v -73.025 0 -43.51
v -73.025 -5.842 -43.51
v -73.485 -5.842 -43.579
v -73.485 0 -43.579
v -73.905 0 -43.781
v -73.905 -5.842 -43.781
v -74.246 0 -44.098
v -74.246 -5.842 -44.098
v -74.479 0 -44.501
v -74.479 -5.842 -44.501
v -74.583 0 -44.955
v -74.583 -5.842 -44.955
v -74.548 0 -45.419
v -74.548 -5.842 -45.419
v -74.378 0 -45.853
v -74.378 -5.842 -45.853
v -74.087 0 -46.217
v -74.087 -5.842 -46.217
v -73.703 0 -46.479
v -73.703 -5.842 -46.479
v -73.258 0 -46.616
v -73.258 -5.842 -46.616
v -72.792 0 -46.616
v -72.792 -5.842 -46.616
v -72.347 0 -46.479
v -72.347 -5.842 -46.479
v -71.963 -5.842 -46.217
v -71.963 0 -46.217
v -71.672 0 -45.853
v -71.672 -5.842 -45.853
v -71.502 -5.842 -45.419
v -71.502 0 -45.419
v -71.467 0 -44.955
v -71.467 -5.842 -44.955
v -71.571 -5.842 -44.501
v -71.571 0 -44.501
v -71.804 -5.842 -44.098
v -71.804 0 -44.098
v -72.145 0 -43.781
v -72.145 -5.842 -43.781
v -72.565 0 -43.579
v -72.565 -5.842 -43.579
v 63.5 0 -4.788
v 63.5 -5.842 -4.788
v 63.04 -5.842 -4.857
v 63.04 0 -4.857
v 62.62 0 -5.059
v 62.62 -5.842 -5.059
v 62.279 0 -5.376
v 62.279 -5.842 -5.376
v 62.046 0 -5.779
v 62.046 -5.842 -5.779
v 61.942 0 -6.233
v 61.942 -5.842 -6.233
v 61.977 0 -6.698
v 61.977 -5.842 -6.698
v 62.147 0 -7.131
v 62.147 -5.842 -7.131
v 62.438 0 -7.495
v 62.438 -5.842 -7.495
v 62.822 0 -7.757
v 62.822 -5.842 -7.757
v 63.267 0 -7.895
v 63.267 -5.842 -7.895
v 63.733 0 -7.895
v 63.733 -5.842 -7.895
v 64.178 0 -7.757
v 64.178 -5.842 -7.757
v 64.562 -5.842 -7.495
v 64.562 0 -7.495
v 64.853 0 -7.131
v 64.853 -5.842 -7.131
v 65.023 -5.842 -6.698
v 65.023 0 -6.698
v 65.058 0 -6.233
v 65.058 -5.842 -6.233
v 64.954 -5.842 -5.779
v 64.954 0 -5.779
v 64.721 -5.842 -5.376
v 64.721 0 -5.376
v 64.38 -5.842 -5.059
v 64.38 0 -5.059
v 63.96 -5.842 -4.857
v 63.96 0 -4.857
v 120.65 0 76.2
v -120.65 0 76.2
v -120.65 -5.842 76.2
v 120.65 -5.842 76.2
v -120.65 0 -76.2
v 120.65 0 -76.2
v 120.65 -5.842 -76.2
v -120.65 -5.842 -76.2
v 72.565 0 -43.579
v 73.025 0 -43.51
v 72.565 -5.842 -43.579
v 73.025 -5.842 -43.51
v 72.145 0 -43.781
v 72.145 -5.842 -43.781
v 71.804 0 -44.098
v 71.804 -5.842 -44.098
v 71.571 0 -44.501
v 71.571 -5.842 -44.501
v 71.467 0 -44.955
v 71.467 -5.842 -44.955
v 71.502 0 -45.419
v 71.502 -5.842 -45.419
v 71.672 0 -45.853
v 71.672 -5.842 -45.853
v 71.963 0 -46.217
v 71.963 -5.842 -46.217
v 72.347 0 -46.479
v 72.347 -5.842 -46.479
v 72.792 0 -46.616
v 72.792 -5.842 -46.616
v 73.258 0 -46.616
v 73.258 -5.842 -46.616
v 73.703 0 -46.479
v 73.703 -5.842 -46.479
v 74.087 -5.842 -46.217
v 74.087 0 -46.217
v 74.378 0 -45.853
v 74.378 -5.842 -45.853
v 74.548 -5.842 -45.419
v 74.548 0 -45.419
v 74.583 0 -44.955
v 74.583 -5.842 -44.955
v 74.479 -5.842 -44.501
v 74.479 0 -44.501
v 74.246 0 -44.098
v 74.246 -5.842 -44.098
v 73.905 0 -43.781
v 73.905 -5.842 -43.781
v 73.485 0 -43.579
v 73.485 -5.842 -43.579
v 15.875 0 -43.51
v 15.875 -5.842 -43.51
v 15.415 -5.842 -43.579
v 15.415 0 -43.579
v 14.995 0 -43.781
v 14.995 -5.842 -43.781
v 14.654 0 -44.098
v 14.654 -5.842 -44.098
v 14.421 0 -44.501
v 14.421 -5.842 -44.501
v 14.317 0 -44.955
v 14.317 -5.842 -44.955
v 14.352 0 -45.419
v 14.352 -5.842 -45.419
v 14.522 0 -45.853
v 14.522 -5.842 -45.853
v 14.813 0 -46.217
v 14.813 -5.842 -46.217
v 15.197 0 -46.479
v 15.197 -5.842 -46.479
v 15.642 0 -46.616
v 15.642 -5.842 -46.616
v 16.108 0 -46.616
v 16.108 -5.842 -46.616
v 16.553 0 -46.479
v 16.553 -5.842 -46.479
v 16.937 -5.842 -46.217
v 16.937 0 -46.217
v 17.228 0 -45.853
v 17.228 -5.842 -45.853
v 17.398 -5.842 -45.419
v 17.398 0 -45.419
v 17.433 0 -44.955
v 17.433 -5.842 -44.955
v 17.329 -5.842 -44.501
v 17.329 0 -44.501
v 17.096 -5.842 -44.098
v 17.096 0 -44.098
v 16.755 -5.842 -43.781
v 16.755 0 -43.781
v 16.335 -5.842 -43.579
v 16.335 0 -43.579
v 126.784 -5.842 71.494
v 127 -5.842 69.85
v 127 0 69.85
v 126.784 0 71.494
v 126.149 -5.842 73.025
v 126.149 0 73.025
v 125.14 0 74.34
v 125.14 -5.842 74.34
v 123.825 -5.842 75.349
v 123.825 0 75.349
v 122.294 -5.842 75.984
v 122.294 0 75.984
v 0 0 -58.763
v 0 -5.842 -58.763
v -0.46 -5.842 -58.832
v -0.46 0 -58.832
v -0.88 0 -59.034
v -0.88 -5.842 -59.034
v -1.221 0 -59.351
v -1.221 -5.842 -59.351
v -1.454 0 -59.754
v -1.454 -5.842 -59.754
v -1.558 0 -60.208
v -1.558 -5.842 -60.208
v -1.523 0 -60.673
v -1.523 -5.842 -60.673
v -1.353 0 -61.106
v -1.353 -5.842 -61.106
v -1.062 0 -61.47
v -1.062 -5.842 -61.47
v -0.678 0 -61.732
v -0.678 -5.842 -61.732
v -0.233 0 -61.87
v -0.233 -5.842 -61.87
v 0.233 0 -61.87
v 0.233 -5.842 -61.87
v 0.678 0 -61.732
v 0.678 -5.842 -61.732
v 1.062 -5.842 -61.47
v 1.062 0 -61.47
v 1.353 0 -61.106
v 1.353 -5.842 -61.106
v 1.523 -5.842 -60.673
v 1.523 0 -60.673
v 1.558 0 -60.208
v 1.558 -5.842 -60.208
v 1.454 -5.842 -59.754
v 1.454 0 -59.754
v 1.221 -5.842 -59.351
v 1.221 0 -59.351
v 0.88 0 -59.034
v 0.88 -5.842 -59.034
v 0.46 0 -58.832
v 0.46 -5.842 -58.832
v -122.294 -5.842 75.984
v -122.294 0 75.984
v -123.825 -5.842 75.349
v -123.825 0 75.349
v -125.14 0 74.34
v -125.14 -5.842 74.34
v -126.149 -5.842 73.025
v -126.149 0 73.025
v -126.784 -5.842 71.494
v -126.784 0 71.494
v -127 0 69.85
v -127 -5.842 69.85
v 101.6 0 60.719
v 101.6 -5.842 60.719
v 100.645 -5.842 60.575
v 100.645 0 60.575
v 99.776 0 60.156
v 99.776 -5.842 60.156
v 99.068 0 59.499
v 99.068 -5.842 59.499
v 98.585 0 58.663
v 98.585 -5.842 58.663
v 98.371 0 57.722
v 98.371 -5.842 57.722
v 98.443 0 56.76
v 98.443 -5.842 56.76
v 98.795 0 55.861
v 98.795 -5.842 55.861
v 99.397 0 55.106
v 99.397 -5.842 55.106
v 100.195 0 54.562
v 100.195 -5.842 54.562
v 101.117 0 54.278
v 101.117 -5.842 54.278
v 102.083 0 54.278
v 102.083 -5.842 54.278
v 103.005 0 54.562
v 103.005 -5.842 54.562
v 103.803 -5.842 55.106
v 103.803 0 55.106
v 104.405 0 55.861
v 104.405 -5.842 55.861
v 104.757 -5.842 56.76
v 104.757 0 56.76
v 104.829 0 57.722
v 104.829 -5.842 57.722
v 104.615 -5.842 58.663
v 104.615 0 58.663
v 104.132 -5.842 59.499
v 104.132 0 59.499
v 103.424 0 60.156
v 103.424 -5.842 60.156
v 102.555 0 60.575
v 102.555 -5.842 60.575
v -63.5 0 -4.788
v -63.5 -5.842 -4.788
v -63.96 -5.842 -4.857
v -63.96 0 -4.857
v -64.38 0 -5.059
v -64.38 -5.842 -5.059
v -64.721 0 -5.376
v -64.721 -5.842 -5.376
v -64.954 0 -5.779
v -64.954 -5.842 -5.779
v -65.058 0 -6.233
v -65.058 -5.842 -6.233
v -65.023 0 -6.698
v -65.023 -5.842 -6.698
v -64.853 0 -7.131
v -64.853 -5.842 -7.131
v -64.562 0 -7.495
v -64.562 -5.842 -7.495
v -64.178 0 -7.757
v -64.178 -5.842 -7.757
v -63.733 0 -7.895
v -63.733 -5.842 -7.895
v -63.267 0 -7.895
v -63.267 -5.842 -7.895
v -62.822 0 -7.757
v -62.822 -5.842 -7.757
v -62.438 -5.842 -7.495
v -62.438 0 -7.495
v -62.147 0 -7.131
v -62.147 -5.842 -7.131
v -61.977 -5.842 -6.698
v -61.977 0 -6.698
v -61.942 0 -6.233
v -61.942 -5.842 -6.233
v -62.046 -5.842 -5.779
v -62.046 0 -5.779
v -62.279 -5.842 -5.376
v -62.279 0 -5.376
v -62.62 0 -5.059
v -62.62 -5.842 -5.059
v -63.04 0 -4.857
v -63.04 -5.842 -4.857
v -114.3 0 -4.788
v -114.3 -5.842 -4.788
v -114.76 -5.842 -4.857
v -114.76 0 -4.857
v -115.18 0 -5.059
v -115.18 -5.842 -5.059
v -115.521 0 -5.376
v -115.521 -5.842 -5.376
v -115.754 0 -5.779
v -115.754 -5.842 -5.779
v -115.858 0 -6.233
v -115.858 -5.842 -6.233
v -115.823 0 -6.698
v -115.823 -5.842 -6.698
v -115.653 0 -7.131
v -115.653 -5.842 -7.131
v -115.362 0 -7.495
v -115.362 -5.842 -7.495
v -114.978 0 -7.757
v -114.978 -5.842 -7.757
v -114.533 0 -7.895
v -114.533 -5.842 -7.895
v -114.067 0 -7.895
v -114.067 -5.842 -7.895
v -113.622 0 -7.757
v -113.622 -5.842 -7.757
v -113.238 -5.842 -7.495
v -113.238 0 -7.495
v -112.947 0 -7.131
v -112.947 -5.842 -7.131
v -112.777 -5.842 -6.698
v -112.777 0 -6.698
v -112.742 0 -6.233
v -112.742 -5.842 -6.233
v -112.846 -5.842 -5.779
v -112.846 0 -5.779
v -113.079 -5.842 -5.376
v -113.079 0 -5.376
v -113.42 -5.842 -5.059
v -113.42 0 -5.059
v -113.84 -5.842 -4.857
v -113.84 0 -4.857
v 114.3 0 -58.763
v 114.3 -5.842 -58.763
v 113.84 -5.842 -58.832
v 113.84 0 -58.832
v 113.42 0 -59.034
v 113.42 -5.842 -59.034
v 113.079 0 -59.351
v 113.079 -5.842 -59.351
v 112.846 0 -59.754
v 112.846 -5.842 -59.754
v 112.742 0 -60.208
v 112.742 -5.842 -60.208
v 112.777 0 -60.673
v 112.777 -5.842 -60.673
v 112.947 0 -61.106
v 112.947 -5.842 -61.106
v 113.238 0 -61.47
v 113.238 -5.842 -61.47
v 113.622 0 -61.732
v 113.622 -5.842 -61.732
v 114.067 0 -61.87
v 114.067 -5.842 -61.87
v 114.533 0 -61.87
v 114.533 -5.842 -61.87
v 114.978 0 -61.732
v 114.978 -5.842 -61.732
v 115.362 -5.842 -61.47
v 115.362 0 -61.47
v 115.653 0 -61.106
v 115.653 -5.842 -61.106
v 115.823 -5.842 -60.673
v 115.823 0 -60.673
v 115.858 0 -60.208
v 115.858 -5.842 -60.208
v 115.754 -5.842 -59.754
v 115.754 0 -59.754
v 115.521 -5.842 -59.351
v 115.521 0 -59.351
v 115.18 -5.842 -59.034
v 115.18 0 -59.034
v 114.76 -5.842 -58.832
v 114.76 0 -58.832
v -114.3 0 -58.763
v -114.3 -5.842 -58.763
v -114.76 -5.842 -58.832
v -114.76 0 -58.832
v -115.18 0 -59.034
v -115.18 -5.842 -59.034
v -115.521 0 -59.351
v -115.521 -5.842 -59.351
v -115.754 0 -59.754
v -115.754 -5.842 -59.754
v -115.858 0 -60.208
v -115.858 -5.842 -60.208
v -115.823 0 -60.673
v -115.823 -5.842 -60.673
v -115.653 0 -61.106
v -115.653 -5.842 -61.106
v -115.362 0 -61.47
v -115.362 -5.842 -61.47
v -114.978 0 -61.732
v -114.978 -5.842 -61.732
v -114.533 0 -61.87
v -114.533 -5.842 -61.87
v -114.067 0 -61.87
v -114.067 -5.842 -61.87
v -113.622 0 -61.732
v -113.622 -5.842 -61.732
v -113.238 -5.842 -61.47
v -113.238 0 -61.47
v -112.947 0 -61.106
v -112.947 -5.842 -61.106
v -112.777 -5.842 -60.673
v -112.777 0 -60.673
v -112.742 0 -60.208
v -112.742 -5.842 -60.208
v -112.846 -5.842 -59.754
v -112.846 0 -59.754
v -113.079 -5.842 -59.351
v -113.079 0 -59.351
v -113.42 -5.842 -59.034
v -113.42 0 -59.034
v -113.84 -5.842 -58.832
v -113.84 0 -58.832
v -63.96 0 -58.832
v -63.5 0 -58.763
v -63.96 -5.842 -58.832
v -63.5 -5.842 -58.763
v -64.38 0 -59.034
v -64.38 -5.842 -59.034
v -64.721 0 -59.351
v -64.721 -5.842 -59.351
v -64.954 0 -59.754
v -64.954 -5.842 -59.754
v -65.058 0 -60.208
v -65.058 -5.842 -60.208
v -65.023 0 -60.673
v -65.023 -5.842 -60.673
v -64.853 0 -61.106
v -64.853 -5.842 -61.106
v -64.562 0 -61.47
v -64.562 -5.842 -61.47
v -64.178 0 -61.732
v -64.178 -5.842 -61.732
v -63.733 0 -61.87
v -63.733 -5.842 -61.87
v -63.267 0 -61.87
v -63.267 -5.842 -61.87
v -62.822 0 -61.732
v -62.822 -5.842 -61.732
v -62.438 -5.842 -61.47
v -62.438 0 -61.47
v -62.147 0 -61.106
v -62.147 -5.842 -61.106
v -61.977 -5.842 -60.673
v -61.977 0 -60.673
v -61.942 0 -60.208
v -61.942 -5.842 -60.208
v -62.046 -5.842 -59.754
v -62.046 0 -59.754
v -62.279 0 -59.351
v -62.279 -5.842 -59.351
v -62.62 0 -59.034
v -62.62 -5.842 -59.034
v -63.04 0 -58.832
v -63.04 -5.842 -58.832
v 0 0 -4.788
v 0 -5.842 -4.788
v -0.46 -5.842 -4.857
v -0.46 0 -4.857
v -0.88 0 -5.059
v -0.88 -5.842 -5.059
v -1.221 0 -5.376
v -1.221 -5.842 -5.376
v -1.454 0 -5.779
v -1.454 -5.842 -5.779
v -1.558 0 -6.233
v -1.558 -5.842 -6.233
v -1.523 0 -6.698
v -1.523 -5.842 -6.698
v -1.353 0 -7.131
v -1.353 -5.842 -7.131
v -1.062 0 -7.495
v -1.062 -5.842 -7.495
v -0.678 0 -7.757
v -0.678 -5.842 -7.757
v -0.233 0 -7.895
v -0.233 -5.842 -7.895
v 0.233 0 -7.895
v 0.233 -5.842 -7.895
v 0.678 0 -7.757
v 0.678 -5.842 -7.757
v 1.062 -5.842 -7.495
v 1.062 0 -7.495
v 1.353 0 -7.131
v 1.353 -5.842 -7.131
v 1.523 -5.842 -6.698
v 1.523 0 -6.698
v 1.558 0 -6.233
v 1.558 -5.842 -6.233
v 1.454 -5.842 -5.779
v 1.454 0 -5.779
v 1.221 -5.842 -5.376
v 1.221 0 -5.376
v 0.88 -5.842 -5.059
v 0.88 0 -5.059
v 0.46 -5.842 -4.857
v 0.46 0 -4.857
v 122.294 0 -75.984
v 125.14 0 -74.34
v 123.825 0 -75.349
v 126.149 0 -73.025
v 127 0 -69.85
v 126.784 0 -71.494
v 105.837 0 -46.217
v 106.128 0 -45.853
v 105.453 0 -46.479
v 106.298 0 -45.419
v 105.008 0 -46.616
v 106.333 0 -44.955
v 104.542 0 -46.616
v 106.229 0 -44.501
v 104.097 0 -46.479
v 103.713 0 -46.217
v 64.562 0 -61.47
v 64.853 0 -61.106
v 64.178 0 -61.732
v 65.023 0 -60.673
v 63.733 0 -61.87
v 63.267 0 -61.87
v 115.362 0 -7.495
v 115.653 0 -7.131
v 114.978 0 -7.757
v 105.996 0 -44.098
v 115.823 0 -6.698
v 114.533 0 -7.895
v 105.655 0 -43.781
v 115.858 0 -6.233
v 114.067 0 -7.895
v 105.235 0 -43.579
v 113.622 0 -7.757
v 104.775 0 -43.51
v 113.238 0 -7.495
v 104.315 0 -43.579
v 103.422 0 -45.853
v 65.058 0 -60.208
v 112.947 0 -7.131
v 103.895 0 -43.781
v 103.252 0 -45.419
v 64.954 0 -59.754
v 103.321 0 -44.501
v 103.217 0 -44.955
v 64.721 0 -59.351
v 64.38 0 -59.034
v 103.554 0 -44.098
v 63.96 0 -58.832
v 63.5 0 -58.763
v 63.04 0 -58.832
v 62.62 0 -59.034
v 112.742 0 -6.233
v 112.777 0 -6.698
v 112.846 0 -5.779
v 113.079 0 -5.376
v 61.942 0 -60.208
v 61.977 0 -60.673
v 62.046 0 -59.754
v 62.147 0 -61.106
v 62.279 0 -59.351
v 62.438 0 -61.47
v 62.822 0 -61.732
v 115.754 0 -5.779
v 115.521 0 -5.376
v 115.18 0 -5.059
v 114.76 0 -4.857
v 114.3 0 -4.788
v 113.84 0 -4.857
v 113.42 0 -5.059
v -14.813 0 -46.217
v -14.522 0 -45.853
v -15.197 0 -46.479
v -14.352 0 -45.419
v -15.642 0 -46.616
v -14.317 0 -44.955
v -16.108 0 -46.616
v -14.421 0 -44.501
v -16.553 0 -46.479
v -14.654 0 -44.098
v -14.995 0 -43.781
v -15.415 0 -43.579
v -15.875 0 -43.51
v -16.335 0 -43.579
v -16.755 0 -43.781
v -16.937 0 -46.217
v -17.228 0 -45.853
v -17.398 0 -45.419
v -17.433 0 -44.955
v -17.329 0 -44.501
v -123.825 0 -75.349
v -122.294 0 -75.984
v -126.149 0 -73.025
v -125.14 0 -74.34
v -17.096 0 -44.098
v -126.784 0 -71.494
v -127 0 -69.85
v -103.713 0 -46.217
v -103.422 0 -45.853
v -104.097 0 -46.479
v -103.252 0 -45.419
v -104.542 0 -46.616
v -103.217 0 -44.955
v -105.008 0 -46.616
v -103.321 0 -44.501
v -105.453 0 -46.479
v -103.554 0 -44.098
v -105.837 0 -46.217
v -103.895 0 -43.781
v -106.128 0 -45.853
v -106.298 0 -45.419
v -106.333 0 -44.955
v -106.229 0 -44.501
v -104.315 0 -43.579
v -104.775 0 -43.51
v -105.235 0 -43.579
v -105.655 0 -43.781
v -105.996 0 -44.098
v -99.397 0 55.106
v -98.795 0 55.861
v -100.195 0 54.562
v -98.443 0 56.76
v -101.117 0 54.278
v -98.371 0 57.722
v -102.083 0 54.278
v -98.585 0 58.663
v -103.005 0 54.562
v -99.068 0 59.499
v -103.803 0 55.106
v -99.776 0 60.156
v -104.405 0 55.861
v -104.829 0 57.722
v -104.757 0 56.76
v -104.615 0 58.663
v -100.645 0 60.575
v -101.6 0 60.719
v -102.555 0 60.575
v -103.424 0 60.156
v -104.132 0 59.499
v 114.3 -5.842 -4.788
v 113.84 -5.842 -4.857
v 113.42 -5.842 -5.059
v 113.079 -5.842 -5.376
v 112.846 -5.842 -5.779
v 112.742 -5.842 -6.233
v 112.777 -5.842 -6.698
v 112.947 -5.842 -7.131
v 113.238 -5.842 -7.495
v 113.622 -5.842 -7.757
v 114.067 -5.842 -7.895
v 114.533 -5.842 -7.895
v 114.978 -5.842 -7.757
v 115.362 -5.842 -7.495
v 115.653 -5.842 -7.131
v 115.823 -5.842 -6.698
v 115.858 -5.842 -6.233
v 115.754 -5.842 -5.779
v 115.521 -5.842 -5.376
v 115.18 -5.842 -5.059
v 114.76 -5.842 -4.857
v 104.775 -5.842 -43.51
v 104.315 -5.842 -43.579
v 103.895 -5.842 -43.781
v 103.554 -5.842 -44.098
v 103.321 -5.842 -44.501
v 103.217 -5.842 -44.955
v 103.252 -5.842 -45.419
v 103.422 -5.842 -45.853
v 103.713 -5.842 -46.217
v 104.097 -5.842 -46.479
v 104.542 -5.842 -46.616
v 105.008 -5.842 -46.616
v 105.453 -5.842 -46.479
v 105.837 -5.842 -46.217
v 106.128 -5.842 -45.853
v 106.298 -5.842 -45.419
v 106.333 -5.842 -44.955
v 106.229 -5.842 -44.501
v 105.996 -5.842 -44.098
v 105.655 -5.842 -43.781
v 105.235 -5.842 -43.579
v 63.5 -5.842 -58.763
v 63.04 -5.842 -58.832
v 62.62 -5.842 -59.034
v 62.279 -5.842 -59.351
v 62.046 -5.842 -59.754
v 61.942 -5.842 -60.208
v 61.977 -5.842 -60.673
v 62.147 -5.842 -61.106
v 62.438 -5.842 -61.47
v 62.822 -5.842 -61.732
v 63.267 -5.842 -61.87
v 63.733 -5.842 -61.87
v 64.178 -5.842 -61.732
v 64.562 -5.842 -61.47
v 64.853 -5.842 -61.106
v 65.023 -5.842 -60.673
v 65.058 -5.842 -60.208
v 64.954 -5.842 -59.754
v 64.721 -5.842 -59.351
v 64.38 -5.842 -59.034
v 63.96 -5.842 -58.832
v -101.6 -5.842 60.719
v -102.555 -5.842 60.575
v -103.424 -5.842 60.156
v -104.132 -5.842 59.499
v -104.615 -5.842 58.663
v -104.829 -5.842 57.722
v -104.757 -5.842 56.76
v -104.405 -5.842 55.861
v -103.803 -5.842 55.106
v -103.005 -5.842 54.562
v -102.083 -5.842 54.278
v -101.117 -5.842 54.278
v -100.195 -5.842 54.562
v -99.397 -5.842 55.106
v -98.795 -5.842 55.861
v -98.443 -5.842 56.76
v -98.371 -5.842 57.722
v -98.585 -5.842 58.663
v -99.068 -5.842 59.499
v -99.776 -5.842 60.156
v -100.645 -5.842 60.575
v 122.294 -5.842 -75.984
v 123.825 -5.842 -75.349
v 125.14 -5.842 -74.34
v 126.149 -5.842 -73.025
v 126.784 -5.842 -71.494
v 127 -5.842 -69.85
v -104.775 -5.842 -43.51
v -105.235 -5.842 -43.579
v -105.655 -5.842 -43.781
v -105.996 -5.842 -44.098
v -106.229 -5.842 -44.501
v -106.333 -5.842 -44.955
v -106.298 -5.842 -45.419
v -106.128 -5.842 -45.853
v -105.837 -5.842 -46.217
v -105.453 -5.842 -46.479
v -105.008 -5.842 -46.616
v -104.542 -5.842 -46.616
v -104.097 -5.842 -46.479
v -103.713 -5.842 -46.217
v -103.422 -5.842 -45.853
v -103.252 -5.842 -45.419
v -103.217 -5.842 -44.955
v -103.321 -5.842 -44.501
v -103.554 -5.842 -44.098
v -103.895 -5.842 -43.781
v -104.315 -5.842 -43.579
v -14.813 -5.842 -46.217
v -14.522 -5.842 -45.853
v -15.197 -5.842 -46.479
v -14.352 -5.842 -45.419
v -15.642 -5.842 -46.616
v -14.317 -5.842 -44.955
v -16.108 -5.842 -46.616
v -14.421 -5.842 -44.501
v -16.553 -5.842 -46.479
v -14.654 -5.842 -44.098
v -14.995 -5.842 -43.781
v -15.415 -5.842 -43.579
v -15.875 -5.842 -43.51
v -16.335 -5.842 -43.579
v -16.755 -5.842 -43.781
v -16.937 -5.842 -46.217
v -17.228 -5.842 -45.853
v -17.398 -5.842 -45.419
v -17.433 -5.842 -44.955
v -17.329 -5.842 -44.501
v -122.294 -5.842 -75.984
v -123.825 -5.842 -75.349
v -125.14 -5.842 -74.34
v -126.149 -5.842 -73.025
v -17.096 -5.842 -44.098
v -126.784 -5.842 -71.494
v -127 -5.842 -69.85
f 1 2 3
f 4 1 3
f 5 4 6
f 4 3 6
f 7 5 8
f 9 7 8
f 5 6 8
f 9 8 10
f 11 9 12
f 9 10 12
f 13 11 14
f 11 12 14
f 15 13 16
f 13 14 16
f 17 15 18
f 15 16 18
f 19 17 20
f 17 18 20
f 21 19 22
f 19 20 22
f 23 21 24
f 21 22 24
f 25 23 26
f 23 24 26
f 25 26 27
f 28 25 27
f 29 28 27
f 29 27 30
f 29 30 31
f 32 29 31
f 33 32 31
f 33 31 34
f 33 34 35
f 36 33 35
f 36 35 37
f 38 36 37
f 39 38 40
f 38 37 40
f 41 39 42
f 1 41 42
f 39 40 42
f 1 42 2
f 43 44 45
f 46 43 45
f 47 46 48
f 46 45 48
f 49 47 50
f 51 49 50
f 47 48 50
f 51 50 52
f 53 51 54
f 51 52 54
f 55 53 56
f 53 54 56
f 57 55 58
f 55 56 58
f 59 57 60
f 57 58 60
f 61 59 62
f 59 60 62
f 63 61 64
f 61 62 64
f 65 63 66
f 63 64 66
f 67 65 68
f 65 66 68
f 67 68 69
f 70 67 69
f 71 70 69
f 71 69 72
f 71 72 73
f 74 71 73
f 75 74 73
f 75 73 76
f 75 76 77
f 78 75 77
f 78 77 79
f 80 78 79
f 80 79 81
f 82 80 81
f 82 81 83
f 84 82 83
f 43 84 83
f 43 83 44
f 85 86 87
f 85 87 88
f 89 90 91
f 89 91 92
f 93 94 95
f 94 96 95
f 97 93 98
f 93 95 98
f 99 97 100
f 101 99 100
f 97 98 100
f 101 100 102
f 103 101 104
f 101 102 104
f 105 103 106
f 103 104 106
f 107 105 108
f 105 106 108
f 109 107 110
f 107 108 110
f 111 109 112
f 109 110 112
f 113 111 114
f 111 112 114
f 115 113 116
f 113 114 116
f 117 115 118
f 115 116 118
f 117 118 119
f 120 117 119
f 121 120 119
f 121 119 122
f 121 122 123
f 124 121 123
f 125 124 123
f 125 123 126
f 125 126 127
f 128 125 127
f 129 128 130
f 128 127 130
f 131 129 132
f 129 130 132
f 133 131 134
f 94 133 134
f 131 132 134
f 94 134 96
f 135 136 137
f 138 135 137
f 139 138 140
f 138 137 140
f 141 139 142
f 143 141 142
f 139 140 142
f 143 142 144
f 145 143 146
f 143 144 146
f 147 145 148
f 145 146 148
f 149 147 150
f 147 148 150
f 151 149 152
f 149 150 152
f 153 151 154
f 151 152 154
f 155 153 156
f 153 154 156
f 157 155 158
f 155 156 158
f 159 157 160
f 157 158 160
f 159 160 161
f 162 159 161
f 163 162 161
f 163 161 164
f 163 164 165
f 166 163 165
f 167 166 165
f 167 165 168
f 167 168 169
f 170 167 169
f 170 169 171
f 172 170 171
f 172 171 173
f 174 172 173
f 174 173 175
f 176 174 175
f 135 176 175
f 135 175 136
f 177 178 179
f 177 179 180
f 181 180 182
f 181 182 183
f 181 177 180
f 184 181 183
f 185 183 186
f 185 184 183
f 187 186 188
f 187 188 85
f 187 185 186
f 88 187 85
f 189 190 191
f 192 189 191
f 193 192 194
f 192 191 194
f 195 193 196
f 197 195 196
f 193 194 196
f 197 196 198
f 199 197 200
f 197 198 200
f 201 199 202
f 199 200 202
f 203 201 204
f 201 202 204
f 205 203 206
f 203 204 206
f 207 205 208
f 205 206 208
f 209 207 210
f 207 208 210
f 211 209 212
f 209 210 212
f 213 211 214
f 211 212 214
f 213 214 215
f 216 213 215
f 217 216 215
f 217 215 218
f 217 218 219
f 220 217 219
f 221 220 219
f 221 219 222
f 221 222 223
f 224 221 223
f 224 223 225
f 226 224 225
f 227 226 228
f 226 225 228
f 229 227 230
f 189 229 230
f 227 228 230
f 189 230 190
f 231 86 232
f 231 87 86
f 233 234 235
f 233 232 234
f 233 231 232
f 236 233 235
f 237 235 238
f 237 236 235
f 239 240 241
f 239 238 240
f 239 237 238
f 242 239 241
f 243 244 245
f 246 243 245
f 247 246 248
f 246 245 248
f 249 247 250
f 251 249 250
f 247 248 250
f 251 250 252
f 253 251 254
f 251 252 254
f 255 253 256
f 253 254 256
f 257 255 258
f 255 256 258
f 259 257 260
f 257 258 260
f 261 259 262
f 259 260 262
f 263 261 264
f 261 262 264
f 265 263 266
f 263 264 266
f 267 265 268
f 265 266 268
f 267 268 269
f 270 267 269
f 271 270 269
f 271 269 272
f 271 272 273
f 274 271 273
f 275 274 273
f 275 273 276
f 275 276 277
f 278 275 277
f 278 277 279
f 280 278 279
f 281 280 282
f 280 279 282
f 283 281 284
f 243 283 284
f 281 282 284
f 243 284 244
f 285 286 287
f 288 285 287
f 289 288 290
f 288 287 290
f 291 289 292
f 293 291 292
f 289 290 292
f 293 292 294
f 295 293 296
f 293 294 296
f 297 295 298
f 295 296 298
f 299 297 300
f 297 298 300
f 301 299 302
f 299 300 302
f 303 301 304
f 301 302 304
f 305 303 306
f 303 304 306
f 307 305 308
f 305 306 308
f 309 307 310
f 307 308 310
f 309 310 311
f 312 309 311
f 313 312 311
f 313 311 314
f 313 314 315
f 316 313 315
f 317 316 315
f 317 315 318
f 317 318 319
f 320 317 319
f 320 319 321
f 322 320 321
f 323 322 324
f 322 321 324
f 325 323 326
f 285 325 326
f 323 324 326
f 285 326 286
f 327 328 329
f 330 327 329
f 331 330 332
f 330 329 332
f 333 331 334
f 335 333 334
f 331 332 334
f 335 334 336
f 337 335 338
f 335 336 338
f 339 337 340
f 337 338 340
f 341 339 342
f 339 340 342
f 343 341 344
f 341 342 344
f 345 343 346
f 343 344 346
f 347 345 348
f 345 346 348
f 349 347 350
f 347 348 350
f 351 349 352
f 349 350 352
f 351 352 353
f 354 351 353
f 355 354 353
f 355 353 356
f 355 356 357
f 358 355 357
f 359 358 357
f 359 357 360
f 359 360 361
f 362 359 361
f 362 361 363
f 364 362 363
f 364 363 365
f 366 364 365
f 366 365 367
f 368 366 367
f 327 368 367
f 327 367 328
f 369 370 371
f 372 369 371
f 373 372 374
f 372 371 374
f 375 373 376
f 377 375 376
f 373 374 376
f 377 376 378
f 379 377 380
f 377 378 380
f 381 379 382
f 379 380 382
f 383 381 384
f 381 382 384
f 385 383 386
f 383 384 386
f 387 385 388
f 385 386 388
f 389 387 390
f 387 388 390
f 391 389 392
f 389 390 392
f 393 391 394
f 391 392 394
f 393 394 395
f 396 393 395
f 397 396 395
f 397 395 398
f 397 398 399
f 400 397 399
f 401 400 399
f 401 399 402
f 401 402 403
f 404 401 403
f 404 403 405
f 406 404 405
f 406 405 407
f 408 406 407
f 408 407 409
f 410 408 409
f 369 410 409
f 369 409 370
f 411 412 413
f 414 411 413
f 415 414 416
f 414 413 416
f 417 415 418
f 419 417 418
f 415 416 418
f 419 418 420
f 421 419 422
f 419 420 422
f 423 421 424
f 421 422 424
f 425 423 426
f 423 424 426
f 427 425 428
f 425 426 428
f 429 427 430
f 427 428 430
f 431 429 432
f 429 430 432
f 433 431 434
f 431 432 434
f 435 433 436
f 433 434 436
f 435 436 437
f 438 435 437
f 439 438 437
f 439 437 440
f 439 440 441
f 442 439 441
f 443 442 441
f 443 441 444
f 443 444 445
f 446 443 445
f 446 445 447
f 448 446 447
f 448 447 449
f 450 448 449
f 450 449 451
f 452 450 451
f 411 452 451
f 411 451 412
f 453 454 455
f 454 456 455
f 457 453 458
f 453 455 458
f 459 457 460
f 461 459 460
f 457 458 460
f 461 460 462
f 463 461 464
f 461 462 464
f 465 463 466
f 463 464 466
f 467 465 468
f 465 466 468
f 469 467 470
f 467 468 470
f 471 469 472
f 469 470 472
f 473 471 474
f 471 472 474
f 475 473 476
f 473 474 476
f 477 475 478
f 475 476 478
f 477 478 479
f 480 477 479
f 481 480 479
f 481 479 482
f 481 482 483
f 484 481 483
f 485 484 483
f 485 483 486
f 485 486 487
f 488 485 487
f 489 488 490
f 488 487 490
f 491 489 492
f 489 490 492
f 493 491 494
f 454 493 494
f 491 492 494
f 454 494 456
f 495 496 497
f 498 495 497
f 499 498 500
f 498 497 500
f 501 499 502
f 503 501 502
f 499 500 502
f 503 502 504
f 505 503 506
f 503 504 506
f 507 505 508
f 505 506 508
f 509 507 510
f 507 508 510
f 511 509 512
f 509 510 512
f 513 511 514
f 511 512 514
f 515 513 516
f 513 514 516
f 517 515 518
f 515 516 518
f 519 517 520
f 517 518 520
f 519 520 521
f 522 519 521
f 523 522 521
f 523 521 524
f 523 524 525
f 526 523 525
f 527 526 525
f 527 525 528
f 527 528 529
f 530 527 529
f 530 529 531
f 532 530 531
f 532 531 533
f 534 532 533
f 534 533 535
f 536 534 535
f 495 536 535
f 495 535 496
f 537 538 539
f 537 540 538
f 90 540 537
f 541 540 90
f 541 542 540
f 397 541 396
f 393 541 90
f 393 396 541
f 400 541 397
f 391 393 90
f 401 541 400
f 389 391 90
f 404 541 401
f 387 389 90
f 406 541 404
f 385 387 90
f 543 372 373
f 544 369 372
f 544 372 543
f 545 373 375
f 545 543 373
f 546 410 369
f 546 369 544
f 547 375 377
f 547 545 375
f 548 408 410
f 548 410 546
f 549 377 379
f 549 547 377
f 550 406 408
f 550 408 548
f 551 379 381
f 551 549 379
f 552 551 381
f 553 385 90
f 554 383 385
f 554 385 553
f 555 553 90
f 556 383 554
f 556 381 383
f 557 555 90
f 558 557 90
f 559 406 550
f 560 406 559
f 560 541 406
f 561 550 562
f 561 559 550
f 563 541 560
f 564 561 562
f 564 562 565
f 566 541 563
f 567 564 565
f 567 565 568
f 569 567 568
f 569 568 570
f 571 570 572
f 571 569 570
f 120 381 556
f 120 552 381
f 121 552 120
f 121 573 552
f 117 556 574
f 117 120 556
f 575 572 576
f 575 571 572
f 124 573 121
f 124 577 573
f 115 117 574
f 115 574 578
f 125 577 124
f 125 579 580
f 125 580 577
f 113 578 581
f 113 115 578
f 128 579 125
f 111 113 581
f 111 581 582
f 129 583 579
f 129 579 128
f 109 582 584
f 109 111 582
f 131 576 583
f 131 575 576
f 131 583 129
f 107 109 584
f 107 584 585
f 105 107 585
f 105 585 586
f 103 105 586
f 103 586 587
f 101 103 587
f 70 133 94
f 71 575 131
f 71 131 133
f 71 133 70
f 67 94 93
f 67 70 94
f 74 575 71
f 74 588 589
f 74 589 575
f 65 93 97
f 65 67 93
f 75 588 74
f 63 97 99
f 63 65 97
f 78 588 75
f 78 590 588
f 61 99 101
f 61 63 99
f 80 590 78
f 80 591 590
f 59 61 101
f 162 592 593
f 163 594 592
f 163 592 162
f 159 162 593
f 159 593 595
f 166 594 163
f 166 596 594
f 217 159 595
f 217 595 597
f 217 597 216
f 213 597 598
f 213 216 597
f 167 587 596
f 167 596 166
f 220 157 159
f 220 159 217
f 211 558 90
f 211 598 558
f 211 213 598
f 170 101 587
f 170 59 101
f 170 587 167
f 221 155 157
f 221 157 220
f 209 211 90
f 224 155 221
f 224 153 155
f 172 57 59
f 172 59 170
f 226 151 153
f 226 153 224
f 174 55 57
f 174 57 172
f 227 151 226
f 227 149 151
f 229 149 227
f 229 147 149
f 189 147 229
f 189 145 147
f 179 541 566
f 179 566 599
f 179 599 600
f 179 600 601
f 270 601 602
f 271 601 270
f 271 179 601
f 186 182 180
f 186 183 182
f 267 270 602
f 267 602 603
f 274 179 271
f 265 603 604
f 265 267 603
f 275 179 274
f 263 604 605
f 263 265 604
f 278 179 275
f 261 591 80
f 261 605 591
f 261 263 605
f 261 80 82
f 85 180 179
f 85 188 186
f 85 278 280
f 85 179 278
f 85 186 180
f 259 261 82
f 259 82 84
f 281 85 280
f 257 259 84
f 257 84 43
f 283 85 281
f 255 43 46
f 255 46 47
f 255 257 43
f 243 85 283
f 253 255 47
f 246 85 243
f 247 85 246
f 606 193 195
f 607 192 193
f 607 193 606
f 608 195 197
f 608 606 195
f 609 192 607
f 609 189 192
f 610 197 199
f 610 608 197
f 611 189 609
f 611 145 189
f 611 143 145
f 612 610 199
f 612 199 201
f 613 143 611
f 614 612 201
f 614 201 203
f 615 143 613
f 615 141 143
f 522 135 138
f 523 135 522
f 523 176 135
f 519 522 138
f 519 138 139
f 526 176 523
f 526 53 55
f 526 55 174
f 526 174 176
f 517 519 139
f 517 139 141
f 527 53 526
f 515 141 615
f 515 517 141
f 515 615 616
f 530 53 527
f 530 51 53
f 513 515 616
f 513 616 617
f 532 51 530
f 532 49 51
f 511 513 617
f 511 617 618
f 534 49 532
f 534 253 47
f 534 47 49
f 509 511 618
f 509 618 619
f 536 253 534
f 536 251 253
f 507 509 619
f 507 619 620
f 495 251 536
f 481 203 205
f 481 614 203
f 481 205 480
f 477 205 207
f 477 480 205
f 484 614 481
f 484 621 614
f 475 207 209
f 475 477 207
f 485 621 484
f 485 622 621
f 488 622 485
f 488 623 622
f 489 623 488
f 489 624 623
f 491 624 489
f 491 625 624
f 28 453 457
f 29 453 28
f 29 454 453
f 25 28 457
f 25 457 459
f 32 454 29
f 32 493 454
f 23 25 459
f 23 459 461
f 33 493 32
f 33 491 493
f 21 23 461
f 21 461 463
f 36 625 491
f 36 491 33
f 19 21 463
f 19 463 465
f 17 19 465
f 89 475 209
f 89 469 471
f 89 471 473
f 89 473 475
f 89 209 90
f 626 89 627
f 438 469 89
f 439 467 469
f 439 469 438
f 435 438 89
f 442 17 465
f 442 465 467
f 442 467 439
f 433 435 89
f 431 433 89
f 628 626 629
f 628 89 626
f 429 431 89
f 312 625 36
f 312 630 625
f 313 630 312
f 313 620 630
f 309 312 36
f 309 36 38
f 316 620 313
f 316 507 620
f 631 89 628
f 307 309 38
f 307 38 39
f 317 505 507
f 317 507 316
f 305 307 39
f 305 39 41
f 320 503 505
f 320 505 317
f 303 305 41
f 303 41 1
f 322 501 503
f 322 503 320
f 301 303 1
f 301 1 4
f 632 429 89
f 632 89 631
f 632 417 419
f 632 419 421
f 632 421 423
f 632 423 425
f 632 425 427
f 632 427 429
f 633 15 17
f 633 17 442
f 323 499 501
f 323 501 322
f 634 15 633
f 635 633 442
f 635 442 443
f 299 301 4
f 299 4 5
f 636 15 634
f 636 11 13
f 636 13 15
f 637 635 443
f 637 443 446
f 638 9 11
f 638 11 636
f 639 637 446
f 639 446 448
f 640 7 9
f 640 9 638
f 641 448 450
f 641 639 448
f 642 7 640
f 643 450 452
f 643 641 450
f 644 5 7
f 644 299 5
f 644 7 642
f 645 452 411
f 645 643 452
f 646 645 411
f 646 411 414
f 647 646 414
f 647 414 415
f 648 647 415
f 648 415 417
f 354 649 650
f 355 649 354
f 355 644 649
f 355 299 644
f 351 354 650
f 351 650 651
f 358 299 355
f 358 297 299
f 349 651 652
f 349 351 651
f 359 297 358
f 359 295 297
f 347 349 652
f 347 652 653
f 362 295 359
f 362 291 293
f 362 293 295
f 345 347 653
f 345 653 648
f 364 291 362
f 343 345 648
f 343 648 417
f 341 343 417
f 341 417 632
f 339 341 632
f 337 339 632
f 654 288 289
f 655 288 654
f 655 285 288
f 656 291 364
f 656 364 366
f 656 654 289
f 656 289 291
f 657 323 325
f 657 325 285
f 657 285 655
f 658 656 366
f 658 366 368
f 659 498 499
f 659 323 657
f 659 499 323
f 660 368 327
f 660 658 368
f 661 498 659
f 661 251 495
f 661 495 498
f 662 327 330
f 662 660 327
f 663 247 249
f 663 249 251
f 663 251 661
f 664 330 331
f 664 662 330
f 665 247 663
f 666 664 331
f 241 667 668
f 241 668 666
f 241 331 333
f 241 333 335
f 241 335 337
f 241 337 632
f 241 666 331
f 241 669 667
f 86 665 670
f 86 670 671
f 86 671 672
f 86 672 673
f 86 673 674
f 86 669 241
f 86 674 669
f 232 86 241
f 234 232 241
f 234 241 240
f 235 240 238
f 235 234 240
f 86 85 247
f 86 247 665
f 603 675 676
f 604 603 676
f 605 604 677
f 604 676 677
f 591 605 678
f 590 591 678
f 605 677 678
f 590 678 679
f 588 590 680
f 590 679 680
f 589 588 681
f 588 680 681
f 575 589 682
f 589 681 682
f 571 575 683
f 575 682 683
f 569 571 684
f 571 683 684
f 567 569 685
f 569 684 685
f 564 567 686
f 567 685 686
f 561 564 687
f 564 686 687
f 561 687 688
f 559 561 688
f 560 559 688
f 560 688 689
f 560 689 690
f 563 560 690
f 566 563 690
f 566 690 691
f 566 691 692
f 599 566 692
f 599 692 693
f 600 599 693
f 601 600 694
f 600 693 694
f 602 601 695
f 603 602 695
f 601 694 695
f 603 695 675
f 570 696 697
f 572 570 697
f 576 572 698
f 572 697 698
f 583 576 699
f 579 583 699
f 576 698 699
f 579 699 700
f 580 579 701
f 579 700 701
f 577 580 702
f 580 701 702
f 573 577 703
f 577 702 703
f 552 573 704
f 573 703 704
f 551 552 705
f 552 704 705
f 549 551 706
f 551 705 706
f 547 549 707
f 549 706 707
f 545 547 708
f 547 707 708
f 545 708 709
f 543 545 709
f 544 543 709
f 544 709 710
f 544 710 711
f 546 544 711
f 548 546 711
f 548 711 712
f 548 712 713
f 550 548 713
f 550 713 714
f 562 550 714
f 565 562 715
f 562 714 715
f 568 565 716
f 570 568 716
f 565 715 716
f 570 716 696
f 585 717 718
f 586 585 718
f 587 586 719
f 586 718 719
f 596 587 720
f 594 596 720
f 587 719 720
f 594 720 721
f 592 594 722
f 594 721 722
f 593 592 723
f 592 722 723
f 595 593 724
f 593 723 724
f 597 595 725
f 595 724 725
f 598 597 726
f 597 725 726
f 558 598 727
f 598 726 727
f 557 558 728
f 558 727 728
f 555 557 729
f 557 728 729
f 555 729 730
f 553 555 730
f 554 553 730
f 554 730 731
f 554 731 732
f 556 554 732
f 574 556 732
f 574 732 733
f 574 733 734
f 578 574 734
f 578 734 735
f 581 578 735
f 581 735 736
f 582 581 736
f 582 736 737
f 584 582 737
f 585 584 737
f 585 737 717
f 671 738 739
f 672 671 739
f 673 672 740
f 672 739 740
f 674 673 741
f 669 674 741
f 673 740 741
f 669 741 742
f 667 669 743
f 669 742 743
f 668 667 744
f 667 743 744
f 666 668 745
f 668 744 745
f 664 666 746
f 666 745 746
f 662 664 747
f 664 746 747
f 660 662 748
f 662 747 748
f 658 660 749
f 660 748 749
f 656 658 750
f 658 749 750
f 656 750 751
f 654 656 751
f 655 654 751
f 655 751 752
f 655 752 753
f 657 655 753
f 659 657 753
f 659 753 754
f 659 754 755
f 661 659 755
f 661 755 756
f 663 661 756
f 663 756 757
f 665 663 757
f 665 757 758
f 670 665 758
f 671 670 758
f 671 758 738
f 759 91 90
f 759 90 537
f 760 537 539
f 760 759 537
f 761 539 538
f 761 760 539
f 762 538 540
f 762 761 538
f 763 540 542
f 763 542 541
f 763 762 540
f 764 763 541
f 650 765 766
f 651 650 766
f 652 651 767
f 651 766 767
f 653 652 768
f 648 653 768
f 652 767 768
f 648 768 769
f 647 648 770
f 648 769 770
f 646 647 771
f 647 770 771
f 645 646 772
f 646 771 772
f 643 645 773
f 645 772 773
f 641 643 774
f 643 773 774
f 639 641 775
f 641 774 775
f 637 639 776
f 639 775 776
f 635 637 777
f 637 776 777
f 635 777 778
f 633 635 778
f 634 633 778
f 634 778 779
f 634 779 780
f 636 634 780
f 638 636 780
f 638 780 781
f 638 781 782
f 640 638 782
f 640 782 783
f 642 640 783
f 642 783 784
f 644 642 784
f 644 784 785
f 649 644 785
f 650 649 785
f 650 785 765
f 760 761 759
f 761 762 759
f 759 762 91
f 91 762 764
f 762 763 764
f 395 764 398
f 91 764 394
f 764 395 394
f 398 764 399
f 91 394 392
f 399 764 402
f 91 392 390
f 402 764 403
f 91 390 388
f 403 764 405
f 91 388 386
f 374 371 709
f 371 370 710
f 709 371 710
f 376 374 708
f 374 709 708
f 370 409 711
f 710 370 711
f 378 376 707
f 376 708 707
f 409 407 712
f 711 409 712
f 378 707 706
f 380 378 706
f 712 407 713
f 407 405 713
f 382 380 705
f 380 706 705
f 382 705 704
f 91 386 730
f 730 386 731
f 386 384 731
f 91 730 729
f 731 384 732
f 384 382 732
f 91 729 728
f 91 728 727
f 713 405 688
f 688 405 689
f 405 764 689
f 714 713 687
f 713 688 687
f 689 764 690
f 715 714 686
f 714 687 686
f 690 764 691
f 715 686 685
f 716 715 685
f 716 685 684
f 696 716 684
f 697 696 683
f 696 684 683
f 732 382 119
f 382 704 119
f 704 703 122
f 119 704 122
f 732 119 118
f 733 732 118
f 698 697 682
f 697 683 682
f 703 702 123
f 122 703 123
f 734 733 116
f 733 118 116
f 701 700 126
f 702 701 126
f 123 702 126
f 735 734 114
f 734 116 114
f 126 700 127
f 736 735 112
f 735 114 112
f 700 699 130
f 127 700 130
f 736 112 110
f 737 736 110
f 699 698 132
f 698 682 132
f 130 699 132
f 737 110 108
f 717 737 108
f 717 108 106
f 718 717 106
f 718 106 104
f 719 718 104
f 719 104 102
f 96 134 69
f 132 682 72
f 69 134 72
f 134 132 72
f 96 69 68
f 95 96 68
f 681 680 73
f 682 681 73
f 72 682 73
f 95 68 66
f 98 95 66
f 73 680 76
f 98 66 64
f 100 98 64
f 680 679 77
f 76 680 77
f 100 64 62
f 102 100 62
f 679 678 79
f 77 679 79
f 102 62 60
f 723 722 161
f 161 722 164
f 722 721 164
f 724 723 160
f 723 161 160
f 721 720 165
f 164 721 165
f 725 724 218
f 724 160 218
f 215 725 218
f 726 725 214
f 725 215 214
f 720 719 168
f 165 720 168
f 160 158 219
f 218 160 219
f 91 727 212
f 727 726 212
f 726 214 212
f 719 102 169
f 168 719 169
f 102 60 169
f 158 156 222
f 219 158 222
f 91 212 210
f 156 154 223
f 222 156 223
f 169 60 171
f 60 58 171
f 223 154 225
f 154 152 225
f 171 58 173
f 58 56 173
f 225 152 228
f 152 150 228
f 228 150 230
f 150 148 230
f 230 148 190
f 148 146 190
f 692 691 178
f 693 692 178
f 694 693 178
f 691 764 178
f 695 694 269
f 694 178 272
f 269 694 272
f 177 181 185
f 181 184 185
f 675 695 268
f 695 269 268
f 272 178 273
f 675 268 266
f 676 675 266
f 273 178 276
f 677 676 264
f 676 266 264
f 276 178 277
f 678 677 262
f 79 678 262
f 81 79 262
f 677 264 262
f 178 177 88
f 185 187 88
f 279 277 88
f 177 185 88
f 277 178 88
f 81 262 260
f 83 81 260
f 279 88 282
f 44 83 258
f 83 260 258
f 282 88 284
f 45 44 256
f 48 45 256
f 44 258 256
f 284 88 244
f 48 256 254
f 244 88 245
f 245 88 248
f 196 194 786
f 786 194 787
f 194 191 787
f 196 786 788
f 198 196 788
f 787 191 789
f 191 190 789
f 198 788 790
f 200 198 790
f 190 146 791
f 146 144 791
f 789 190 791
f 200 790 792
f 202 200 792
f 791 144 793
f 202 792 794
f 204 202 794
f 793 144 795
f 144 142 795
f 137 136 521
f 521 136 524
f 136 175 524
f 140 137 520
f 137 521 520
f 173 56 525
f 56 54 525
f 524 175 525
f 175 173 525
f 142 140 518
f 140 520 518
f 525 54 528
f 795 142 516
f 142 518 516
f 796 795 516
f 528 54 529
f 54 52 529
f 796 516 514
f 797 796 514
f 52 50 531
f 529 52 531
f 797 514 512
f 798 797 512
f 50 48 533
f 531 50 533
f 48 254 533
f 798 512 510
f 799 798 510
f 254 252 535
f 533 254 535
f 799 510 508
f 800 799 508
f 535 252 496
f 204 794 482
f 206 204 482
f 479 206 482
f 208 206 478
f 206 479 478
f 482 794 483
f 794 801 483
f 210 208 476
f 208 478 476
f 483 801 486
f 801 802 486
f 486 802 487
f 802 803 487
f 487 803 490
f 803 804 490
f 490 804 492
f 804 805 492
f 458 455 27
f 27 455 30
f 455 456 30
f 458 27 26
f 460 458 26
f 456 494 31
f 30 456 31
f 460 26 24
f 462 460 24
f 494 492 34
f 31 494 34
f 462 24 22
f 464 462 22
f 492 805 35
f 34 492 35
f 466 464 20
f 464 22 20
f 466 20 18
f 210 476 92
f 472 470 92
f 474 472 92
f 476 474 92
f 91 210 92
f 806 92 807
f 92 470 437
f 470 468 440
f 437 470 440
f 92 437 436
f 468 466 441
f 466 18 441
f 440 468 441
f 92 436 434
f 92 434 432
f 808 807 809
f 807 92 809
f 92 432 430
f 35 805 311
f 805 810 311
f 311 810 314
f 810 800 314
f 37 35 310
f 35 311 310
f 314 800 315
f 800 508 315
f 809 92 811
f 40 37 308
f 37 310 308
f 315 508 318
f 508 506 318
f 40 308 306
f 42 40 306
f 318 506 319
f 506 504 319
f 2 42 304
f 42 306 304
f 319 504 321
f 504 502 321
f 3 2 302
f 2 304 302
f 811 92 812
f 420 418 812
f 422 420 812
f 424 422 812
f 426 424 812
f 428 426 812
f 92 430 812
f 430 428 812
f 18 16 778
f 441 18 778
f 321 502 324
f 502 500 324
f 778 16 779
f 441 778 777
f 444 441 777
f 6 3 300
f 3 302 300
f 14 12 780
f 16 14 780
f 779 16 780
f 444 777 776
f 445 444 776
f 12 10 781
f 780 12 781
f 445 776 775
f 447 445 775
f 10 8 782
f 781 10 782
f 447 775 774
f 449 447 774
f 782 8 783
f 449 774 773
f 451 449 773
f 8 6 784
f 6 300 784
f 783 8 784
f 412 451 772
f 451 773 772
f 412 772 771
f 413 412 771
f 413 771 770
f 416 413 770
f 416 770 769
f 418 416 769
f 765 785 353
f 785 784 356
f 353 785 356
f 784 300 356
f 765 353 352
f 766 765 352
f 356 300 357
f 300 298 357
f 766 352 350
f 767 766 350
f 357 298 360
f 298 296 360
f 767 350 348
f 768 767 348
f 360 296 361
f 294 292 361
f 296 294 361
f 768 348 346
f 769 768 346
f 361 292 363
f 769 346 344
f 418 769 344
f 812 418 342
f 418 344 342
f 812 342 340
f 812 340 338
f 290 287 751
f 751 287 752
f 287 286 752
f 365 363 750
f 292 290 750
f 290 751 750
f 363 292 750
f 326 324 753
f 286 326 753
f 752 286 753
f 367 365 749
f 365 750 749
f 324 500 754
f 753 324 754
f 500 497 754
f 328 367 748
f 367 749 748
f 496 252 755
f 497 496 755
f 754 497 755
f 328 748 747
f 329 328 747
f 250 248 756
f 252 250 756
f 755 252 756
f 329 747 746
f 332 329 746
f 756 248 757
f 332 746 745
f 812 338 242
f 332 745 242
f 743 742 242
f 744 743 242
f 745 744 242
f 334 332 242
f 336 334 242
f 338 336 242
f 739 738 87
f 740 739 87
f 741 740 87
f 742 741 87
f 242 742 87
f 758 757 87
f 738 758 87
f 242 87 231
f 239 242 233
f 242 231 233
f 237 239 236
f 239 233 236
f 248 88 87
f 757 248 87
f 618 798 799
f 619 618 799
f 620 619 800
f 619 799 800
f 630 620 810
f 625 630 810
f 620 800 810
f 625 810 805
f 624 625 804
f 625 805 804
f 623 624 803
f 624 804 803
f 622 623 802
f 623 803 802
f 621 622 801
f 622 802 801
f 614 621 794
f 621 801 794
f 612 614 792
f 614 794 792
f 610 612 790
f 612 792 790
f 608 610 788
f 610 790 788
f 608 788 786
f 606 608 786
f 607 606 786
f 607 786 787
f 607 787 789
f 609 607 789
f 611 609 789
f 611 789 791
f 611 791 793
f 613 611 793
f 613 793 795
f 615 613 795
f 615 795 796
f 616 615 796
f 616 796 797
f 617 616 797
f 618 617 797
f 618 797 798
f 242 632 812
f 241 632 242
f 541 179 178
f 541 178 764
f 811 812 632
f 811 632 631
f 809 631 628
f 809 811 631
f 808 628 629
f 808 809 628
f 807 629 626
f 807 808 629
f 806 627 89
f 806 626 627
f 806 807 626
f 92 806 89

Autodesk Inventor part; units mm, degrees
ref_plane "YZ Plane" through (0, 0, 0) normal (1, 0, 0) x (0, 1, 0)
ref_plane "XZ Plane" through (0, 0, 0) normal (0, 1, 0) x (-1, 0, 0)
ref_plane "XY Plane" through (0, 0, 0) normal (0, 0, 1) x (1, 0, 0)
sketch "Sketch1" plane through (0, 0, 0) normal (0, 1, 0) x (-1, 0, 0)
  line L0 (0, -106.68) -> (0, 106.68) projected
  line L1 (-177.8, 0) -> (177.8, 0) projected
  line L2 (-127, -76.2) -> (127, -76.2)
  line L3 (127, -76.2) -> (127, 76.2)
  line L4 (127, 76.2) -> (-127, 76.2)
  line L5 (-127, 76.2) -> (-127, -76.2)
  line L6 (-127, -76.2) -> (127, 76.2) construction
  line L7 (127, -76.2) -> (-127, 76.2) construction
  line L8 (101.6, 57.4802) -> (-101.6, 57.4802) construction
  line L9 (114.3, -6.35) -> (-114.3, -6.35) construction
  point P0 (0, 0)
  point P1 (0, -6.35)
  point P2 (63.5, -6.35)
  point P3 (-63.5, -6.35)
  dimension "d0" = 254
  dimension "d1" = 152.4
  dimension "d2" = 18.7198
  dimension "d3" = 101.6
  dimension "d4" = 101.6
  dimension "d5" = 82.55
  dimension "d6" = 114.3
  dimension "d7" = 12.7
  dimension "d28" = 50.8
  dimension "d29" = 50.8
extrude "Extrusion1" add sketch "Sketch1" against normal blind 5.842
hole "Hole1" at (-101.6, 0, 57.4802) at (101.6, 0, 57.4802) direction (0, -1, 0) diameter 6.477 end through all
hole "Hole2" at (-114.3, 0, -6.35) at (114.3, 0, -6.35) at (0, 0, -6.35) at (63.5, 0, -6.35) at (-63.5, 0, -6.35) direction (0, -1, 0) diameter 3.1242 end through all
pattern_linear "Rectangular Pattern1" count 2 spacing 53.975 along (0, 0, -1) of "Hole2"
sketch "Sketch2" plane through (0, 0, 0) normal (0, 1, 0) x (1, 0, 0)
  circle A0 centre (-114.3, 60.325) radius 1.5621 projected
  circle A1 centre (-63.5, 60.325) radius 1.5621 projected
  line L0 (-114.3, 60.325) -> (-63.5, 60.325) construction
  line L1 (-88.9, 60.325) -> (-88.9, 44.45) construction
  line L2 (-104.775, 45.0718) -> (-73.025, 45.0718) construction
  point P0 (0, 0)
  dimension "d31" = 31.75
  dimension "d32" = 15.875
  dimension "d33" = 15.875
hole "Hole3" at (-104.775, 0, -45.0718) at (-73.025, 0, -45.0718) direction (0, -1, 0) diameter 3.1242 end through all
fillet "Fillet1" radius 6.35 4 edges at (127, -2.921, 76.2) (127, -2.921, -76.2) (-127, -2.921, 76.2) (-127, -2.921, -76.2)
pattern_linear "Rectangular Pattern2" count 3 spacing 88.9 along (1, 0, 0) of "Hole3"
equation "\"d32\" = 0.5 * d31"
